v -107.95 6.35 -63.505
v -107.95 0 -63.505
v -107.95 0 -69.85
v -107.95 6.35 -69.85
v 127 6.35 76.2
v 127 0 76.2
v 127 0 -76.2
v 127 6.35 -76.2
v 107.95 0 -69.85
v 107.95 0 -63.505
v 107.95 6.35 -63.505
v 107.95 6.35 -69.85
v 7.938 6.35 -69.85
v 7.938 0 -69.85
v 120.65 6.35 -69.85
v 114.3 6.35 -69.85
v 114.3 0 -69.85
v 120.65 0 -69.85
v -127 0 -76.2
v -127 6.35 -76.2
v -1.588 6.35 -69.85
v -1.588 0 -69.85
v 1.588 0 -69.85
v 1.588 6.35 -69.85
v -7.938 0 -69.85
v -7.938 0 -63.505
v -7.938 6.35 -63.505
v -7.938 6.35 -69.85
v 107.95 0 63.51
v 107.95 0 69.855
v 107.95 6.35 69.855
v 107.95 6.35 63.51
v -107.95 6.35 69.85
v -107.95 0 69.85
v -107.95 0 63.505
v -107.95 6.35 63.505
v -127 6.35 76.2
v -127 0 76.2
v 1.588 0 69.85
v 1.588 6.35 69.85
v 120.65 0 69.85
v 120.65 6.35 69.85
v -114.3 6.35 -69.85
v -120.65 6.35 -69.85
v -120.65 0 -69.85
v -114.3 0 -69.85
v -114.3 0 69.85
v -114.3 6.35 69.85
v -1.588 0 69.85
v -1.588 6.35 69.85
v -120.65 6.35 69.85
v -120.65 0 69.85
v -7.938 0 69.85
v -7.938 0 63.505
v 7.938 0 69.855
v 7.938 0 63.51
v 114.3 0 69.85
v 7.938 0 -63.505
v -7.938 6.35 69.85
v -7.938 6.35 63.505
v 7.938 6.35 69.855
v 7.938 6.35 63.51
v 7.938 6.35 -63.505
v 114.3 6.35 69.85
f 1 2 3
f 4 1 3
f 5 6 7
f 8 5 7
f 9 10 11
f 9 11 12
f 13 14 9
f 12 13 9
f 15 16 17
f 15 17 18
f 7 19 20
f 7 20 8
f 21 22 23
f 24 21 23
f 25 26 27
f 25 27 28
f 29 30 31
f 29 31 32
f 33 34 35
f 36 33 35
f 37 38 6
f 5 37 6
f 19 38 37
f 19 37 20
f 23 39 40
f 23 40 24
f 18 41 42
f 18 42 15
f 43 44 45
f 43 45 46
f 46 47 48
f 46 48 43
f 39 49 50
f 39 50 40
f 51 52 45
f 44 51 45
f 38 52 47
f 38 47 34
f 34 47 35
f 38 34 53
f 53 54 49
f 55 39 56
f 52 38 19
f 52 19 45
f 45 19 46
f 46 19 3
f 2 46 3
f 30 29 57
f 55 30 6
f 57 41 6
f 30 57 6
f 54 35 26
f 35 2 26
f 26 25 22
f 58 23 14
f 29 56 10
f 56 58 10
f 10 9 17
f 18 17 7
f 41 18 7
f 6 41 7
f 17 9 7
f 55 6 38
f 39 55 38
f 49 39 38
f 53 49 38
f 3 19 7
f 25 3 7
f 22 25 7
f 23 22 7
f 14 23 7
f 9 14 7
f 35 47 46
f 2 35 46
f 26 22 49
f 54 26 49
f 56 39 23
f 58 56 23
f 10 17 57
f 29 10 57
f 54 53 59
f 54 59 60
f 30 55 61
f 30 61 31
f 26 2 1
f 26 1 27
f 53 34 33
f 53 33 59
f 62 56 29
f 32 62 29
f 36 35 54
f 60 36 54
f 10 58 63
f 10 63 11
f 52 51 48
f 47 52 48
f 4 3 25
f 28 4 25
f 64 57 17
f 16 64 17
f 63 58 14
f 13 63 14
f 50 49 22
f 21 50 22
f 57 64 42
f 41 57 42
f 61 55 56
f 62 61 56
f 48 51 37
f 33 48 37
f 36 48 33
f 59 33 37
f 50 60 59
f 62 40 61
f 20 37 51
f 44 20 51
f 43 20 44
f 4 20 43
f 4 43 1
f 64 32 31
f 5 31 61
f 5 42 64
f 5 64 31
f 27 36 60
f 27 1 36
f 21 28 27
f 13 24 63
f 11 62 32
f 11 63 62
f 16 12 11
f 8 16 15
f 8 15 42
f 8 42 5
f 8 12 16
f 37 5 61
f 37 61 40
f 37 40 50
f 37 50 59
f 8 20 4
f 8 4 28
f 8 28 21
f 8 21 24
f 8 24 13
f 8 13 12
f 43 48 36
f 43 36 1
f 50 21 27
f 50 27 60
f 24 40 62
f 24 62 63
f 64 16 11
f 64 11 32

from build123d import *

# Parameters (mm, degrees)
SKETCH1_W           = 254
SKETCH1_H           = 152.4
SKETCH1_W_2         = 6.35
SKETCH1_H_2         = 139.7
SKETCH1_W_3         = 3.175
SKETCH1_W_4         = 100.0125
SKETCH1_H_3         = 6.34492
BOSS_EXTRUDE1_DEPTH = 6.35


with BuildPart() as part:
    # Sketch1 → Boss-Extrude1 (new body)
    with BuildSketch(Plane(origin=(0, 0, 0), x_dir=(1, 0, 0), z_dir=(0, 1, 0))):
        Rectangle(SKETCH1_W, SKETCH1_H)
        with Locations((117.475, 0)):
            Rectangle(SKETCH1_W_2, SKETCH1_H_2, mode=Mode.SUBTRACT)
        Rectangle(SKETCH1_W_3, SKETCH1_H_2, mode=Mode.SUBTRACT)
        with Locations((-117.475, 0)):
            Rectangle(SKETCH1_W_2, SKETCH1_H_2, mode=Mode.SUBTRACT)
        with Locations((-57.94375, 66.67754)):
            Rectangle(SKETCH1_W_4, SKETCH1_H_3, mode=Mode.SUBTRACT)
        with Locations((57.94375, -66.68262)):
            Rectangle(SKETCH1_W_4, SKETCH1_H_3, mode=Mode.SUBTRACT)
        with Locations((57.94375, 66.67754)):
            Rectangle(SKETCH1_W_4, SKETCH1_H_3, mode=Mode.SUBTRACT)
        with Locations((-57.94375, -66.67754)):
            Rectangle(SKETCH1_W_4, SKETCH1_H_3, mode=Mode.SUBTRACT)
    extrude(amount=BOSS_EXTRUDE1_DEPTH)


solid = part.part
